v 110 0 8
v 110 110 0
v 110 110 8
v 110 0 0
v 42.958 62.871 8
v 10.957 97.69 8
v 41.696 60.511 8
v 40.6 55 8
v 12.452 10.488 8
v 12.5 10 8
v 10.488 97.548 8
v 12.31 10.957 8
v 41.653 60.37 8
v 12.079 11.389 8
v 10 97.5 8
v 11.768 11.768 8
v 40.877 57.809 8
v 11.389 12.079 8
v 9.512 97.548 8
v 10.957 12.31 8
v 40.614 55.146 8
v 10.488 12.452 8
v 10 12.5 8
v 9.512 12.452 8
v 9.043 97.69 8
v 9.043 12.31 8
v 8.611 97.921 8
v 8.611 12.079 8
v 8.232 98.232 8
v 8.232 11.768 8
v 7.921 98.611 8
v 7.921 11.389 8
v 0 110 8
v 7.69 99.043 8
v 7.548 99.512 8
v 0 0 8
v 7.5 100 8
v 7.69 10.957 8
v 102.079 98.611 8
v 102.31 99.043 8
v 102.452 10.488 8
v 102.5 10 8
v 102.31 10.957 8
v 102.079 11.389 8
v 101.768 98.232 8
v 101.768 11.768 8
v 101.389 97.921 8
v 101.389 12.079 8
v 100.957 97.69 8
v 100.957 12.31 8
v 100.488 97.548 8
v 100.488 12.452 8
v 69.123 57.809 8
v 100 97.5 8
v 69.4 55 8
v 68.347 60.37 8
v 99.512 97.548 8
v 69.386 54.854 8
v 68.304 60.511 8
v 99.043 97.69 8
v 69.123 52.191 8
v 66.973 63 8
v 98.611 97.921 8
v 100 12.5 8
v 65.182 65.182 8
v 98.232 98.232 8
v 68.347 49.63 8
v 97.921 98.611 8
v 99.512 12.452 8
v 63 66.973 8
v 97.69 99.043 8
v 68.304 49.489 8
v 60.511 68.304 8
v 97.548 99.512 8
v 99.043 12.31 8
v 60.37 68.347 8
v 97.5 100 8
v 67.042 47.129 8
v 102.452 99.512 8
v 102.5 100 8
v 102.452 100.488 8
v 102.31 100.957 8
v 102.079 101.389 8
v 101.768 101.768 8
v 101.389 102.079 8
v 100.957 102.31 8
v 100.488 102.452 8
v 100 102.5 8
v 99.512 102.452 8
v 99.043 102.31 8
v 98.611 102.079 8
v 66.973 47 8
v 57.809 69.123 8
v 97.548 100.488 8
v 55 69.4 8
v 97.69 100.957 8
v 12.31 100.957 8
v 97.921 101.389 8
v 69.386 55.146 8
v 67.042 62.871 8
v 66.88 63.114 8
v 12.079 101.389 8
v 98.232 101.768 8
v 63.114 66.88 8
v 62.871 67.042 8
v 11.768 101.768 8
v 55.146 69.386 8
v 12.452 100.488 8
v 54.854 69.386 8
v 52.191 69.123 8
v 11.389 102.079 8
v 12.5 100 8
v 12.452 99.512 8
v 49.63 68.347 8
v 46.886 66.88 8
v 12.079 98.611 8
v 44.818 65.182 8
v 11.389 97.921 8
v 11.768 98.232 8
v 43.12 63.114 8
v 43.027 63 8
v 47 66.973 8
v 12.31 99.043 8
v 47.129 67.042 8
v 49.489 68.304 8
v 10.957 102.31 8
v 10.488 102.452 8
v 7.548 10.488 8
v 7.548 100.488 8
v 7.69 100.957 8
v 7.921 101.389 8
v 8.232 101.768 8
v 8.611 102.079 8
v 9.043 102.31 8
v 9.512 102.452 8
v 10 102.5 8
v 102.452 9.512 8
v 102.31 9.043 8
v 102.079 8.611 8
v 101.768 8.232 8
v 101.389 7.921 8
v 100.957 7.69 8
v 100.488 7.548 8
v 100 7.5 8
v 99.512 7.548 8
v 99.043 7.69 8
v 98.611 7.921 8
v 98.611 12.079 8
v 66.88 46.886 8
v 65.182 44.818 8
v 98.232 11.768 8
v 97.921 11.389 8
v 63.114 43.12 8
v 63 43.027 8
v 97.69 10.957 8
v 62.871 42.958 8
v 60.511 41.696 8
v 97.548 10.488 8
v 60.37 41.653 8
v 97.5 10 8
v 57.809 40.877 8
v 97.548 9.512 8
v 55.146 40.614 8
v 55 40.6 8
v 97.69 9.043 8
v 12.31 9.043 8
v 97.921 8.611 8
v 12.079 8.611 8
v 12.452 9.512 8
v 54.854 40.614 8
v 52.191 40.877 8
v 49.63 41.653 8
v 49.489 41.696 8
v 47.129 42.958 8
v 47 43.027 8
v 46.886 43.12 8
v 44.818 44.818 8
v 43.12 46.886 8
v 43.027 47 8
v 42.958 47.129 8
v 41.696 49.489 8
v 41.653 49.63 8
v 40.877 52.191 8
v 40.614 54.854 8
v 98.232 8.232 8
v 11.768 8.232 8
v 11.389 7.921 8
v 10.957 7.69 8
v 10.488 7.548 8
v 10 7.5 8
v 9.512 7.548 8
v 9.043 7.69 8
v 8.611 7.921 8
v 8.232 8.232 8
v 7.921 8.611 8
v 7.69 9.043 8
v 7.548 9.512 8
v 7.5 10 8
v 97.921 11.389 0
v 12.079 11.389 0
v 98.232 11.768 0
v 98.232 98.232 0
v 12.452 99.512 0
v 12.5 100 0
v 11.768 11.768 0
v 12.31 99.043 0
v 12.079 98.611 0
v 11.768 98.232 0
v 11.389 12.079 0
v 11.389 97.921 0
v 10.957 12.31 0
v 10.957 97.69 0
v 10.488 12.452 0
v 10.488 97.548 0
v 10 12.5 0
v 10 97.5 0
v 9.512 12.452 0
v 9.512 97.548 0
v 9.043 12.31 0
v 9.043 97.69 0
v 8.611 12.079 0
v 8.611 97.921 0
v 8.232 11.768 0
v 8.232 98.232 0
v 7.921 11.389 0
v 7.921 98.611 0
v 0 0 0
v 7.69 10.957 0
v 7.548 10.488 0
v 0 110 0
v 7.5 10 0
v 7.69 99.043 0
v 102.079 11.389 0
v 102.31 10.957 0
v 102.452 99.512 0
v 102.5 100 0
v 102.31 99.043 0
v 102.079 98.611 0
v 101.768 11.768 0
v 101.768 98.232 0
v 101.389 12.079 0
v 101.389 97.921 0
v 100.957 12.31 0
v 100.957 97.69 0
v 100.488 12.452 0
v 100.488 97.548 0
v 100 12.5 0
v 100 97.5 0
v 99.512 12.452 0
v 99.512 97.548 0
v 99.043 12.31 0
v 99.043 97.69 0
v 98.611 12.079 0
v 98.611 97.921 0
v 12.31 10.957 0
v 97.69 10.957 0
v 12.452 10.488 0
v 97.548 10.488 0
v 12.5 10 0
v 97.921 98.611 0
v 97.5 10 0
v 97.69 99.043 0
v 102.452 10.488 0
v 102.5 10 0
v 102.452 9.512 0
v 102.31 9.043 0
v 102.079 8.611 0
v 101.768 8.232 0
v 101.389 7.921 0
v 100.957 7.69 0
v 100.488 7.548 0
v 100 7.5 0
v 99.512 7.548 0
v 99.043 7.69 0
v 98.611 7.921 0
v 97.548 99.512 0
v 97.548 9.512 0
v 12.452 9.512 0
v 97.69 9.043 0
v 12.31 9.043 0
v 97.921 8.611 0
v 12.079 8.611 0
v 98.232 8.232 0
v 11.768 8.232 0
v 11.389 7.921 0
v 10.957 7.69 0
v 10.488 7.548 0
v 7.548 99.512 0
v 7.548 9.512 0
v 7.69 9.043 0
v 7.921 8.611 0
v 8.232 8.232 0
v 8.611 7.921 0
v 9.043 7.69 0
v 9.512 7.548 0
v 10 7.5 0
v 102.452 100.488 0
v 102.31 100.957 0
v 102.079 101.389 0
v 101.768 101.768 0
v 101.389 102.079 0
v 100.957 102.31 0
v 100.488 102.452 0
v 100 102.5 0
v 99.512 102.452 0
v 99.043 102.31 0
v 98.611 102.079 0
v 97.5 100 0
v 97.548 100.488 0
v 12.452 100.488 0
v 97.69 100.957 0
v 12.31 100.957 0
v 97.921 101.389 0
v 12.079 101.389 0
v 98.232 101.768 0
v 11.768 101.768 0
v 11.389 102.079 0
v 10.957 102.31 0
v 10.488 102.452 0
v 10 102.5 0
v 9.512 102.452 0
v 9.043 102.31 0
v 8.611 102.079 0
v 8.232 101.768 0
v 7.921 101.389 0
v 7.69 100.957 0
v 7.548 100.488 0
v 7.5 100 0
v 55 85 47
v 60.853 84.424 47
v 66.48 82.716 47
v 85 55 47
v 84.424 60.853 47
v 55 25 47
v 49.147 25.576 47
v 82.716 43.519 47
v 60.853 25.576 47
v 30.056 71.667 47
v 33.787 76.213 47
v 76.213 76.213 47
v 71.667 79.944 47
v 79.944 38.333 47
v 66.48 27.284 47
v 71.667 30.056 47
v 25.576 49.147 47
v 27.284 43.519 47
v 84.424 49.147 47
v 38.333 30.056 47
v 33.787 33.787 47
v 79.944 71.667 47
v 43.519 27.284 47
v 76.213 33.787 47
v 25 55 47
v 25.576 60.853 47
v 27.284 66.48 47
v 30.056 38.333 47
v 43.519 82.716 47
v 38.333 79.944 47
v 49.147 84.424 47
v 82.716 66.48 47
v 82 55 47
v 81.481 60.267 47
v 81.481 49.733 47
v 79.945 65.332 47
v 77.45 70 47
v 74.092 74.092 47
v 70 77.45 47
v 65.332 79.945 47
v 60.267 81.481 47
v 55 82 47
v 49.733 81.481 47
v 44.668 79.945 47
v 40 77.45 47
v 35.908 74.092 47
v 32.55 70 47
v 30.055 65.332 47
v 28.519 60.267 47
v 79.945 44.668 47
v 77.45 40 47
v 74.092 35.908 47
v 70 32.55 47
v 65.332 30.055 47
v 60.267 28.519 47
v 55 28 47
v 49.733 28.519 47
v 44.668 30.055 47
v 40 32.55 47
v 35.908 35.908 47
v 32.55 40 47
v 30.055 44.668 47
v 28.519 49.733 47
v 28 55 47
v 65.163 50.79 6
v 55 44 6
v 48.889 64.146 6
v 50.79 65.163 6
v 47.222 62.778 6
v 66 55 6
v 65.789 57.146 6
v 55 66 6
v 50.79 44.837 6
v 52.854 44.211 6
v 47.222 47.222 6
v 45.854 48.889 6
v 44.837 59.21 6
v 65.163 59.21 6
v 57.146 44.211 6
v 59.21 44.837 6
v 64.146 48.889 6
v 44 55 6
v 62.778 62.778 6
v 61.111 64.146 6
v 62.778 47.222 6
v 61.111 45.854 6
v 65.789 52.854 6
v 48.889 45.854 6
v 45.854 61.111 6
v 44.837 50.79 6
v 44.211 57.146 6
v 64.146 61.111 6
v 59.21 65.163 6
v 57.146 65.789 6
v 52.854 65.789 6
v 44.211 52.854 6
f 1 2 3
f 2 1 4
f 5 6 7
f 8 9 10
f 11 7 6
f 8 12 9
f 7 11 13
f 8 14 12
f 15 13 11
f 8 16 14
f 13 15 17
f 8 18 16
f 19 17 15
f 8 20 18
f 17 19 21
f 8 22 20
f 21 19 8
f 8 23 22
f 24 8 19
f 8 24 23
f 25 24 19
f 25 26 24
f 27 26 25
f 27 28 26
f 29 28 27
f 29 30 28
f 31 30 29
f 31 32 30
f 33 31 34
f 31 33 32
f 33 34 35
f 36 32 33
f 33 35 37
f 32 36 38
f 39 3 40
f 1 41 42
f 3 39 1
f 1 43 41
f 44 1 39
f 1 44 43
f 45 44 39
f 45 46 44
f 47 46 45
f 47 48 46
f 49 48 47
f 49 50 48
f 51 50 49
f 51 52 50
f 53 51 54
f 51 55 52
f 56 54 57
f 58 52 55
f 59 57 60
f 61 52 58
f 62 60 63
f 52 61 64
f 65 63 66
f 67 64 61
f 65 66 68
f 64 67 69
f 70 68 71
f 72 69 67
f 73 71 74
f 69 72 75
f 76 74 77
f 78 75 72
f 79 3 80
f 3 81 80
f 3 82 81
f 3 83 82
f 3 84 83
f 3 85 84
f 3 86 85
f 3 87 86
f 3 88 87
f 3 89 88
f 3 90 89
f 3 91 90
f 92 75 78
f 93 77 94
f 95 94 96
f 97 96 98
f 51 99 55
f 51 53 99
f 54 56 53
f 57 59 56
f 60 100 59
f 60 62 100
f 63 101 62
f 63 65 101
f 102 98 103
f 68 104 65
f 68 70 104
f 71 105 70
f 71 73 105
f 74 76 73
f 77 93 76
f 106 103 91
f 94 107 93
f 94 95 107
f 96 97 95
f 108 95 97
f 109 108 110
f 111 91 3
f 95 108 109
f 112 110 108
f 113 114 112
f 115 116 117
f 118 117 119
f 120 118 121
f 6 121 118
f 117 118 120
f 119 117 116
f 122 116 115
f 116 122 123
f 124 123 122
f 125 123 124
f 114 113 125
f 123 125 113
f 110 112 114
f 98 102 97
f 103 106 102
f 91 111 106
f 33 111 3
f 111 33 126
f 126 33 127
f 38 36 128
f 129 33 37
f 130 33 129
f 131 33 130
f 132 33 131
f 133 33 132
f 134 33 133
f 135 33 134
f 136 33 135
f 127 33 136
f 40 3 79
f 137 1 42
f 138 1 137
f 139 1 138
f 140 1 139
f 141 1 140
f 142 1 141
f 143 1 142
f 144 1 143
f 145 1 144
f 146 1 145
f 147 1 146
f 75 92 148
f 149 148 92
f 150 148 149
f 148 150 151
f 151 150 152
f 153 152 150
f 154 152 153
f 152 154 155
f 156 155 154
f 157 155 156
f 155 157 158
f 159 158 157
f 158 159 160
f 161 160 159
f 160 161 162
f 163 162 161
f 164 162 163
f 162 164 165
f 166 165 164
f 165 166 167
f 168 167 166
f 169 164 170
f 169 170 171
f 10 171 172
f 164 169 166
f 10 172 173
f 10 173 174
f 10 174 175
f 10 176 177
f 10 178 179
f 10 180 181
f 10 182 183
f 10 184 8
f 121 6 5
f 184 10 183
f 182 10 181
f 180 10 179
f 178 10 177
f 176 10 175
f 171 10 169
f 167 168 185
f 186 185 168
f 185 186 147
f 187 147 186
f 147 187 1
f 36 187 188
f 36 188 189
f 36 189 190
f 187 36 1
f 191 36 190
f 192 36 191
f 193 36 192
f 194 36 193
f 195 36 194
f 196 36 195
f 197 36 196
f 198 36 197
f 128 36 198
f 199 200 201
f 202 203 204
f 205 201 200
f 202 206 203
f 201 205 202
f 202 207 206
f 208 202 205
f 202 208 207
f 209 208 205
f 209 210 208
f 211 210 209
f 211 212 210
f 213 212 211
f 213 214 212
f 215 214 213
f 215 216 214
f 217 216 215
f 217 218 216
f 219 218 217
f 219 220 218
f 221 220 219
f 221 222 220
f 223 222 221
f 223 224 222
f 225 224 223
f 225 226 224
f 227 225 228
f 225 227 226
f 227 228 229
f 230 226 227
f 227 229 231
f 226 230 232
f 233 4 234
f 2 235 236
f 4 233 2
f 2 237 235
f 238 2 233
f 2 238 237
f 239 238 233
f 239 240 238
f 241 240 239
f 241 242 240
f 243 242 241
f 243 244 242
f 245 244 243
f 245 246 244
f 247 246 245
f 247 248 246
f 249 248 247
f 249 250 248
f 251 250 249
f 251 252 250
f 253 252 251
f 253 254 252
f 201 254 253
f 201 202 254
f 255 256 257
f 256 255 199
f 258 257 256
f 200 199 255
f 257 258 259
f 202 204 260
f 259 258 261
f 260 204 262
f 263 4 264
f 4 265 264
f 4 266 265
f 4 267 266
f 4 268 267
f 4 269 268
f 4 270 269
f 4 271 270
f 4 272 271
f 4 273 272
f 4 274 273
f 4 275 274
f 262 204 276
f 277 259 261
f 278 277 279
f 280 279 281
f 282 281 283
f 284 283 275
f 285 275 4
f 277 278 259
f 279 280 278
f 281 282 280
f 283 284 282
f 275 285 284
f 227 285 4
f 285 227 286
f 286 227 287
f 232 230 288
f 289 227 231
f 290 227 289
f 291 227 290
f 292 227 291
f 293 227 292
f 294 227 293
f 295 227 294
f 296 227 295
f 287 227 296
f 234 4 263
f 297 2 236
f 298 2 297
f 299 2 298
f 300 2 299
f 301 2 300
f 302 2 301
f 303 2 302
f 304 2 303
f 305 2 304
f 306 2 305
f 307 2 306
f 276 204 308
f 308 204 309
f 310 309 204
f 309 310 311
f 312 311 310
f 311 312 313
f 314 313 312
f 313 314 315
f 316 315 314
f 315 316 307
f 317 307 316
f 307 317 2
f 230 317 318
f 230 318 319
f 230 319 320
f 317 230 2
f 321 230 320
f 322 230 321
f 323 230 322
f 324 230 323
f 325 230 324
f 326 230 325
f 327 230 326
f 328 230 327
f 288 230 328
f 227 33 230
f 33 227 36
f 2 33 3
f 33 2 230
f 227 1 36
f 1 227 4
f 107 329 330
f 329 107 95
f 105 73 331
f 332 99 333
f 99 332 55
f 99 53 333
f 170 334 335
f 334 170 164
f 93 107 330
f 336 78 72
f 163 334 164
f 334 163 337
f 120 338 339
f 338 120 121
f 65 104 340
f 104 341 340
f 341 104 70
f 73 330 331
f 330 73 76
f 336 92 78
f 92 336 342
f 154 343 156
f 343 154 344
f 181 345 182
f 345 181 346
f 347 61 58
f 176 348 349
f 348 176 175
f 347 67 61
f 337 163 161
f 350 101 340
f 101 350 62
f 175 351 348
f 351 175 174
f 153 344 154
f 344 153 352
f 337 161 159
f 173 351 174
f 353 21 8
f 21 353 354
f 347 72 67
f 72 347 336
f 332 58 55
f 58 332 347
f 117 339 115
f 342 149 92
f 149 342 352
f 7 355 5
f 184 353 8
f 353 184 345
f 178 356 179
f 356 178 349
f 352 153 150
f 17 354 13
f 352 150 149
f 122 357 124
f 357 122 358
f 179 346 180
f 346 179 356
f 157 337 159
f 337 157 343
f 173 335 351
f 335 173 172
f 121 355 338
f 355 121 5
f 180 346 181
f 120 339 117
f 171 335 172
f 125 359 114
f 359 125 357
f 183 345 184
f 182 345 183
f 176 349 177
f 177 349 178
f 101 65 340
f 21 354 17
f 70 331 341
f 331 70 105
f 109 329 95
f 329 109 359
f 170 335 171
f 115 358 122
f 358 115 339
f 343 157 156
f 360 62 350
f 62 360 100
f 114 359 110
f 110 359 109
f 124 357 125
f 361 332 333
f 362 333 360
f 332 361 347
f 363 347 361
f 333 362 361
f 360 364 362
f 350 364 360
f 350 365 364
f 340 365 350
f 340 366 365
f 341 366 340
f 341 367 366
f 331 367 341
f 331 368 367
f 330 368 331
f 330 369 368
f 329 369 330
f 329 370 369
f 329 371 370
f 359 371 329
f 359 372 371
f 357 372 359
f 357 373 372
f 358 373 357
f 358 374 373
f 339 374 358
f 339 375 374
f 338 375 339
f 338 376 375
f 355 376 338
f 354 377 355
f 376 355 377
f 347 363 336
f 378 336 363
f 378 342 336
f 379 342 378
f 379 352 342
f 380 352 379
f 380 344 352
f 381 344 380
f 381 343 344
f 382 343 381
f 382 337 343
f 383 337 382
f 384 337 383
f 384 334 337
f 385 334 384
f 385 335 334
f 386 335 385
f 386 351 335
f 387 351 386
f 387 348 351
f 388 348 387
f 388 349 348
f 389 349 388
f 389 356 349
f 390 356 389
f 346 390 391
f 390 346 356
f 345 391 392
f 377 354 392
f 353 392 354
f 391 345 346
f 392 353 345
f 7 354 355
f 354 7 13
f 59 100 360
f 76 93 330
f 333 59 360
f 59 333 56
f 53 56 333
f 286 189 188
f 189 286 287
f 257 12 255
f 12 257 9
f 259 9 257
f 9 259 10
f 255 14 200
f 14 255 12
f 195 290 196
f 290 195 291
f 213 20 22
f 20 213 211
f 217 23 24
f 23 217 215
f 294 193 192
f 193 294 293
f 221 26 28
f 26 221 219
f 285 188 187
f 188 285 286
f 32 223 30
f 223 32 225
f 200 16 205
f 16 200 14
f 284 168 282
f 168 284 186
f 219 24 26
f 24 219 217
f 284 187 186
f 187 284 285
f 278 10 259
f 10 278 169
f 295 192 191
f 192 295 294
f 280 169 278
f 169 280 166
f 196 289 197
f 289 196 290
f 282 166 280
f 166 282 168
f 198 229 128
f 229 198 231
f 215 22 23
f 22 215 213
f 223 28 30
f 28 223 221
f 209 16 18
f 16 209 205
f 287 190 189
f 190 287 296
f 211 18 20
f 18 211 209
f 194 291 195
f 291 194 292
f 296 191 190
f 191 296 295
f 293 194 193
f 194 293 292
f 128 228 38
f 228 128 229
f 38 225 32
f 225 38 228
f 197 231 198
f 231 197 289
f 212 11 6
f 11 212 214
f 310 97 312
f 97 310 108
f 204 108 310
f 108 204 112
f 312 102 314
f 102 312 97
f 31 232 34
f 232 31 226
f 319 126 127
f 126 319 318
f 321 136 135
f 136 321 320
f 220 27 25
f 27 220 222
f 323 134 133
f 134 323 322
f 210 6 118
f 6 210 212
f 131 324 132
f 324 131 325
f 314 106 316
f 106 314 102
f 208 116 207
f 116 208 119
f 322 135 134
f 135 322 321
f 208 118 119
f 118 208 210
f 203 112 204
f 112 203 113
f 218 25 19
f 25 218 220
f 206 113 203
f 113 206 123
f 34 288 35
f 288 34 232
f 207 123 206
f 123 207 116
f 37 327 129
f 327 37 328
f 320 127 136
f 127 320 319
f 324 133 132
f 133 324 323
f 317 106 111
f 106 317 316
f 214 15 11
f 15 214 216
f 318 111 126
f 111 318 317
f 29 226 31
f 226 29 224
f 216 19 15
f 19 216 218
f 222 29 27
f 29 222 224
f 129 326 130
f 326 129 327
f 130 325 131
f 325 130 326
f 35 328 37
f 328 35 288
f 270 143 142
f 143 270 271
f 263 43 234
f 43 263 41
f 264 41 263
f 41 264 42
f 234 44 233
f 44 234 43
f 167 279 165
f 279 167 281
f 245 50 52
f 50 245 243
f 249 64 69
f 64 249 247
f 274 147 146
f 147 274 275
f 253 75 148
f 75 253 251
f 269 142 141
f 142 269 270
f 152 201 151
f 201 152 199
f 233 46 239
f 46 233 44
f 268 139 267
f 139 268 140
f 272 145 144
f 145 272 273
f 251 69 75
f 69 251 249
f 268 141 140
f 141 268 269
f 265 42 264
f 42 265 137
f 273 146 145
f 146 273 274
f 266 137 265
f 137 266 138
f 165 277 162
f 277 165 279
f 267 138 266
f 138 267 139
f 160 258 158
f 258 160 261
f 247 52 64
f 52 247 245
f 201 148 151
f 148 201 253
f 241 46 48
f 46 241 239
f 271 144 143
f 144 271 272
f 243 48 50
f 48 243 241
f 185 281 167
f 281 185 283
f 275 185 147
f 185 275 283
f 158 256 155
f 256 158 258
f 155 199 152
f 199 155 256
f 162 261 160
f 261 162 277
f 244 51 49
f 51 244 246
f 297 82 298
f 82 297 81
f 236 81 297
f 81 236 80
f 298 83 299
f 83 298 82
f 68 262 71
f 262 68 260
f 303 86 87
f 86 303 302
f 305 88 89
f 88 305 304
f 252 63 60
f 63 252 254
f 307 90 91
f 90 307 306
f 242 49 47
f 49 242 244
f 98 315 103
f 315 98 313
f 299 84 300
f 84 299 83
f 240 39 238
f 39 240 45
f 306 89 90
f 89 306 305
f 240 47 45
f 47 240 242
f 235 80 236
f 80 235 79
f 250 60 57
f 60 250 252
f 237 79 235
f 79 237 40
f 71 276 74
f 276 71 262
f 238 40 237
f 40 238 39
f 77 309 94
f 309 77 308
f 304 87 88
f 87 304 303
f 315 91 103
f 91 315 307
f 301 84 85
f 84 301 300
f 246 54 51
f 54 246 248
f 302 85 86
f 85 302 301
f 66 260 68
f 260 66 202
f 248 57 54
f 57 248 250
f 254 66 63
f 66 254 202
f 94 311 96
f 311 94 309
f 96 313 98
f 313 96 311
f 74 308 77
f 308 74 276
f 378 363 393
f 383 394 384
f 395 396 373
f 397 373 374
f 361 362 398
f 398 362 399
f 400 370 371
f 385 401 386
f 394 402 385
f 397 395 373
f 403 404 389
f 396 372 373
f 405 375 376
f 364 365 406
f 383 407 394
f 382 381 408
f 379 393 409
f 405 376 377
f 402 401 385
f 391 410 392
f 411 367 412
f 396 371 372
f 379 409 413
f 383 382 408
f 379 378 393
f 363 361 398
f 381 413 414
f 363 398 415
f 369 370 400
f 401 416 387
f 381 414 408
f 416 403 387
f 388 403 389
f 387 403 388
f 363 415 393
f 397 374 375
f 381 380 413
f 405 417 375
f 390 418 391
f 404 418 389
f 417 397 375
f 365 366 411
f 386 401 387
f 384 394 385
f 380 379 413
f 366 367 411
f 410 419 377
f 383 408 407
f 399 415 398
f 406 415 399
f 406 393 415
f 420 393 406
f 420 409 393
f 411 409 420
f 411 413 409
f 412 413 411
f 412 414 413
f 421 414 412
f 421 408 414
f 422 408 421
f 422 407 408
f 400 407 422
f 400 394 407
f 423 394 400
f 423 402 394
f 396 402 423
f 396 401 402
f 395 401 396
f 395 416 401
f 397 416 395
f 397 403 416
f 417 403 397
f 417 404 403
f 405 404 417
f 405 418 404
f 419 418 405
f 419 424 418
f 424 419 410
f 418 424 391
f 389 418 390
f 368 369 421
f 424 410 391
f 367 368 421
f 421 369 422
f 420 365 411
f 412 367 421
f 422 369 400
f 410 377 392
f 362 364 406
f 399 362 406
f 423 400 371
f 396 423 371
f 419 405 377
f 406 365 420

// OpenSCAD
$fn = 32;

// ----------------------------------------------------------------------
// Hopper: flanged with square flange
// ----------------------------------------------------------------------

// --- parameters (mm) ---
fl = 110;                 // flange side, X and Y
fl_t = 8;                 // flange thickness
cone_h = 40;              // cone height above the flange
top_d = 60;               // cone mouth diameter
bot_d = 28;               // cone spout diameter
wall = 3;                 // cone wall thickness
hole_r = 2.5;             // flange hole radius
hole_in = 10;             // hole inset from the corners

bore_d = bot_d - 2 * wall;  // spout bore diameter
total_h = fl_t + cone_h - 1;  // overall height

difference() {
  union() {
    cube([fl, fl, fl_t]);
    translate([fl / 2, fl / 2, fl_t - 1])
      cylinder(h = cone_h, d1 = bot_d, d2 = top_d);
  }
  translate([fl / 2, fl / 2, fl_t - 2])
    cylinder(h = cone_h + 1, d1 = bore_d, d2 = top_d - 2 * wall);
  for (sx = [0, 1], sy = [0, 1])
    translate([sx ? fl - hole_in : hole_in,
               sy ? fl - hole_in : hole_in, -1])
      cylinder(r = hole_r, h = fl_t + 2);
}
